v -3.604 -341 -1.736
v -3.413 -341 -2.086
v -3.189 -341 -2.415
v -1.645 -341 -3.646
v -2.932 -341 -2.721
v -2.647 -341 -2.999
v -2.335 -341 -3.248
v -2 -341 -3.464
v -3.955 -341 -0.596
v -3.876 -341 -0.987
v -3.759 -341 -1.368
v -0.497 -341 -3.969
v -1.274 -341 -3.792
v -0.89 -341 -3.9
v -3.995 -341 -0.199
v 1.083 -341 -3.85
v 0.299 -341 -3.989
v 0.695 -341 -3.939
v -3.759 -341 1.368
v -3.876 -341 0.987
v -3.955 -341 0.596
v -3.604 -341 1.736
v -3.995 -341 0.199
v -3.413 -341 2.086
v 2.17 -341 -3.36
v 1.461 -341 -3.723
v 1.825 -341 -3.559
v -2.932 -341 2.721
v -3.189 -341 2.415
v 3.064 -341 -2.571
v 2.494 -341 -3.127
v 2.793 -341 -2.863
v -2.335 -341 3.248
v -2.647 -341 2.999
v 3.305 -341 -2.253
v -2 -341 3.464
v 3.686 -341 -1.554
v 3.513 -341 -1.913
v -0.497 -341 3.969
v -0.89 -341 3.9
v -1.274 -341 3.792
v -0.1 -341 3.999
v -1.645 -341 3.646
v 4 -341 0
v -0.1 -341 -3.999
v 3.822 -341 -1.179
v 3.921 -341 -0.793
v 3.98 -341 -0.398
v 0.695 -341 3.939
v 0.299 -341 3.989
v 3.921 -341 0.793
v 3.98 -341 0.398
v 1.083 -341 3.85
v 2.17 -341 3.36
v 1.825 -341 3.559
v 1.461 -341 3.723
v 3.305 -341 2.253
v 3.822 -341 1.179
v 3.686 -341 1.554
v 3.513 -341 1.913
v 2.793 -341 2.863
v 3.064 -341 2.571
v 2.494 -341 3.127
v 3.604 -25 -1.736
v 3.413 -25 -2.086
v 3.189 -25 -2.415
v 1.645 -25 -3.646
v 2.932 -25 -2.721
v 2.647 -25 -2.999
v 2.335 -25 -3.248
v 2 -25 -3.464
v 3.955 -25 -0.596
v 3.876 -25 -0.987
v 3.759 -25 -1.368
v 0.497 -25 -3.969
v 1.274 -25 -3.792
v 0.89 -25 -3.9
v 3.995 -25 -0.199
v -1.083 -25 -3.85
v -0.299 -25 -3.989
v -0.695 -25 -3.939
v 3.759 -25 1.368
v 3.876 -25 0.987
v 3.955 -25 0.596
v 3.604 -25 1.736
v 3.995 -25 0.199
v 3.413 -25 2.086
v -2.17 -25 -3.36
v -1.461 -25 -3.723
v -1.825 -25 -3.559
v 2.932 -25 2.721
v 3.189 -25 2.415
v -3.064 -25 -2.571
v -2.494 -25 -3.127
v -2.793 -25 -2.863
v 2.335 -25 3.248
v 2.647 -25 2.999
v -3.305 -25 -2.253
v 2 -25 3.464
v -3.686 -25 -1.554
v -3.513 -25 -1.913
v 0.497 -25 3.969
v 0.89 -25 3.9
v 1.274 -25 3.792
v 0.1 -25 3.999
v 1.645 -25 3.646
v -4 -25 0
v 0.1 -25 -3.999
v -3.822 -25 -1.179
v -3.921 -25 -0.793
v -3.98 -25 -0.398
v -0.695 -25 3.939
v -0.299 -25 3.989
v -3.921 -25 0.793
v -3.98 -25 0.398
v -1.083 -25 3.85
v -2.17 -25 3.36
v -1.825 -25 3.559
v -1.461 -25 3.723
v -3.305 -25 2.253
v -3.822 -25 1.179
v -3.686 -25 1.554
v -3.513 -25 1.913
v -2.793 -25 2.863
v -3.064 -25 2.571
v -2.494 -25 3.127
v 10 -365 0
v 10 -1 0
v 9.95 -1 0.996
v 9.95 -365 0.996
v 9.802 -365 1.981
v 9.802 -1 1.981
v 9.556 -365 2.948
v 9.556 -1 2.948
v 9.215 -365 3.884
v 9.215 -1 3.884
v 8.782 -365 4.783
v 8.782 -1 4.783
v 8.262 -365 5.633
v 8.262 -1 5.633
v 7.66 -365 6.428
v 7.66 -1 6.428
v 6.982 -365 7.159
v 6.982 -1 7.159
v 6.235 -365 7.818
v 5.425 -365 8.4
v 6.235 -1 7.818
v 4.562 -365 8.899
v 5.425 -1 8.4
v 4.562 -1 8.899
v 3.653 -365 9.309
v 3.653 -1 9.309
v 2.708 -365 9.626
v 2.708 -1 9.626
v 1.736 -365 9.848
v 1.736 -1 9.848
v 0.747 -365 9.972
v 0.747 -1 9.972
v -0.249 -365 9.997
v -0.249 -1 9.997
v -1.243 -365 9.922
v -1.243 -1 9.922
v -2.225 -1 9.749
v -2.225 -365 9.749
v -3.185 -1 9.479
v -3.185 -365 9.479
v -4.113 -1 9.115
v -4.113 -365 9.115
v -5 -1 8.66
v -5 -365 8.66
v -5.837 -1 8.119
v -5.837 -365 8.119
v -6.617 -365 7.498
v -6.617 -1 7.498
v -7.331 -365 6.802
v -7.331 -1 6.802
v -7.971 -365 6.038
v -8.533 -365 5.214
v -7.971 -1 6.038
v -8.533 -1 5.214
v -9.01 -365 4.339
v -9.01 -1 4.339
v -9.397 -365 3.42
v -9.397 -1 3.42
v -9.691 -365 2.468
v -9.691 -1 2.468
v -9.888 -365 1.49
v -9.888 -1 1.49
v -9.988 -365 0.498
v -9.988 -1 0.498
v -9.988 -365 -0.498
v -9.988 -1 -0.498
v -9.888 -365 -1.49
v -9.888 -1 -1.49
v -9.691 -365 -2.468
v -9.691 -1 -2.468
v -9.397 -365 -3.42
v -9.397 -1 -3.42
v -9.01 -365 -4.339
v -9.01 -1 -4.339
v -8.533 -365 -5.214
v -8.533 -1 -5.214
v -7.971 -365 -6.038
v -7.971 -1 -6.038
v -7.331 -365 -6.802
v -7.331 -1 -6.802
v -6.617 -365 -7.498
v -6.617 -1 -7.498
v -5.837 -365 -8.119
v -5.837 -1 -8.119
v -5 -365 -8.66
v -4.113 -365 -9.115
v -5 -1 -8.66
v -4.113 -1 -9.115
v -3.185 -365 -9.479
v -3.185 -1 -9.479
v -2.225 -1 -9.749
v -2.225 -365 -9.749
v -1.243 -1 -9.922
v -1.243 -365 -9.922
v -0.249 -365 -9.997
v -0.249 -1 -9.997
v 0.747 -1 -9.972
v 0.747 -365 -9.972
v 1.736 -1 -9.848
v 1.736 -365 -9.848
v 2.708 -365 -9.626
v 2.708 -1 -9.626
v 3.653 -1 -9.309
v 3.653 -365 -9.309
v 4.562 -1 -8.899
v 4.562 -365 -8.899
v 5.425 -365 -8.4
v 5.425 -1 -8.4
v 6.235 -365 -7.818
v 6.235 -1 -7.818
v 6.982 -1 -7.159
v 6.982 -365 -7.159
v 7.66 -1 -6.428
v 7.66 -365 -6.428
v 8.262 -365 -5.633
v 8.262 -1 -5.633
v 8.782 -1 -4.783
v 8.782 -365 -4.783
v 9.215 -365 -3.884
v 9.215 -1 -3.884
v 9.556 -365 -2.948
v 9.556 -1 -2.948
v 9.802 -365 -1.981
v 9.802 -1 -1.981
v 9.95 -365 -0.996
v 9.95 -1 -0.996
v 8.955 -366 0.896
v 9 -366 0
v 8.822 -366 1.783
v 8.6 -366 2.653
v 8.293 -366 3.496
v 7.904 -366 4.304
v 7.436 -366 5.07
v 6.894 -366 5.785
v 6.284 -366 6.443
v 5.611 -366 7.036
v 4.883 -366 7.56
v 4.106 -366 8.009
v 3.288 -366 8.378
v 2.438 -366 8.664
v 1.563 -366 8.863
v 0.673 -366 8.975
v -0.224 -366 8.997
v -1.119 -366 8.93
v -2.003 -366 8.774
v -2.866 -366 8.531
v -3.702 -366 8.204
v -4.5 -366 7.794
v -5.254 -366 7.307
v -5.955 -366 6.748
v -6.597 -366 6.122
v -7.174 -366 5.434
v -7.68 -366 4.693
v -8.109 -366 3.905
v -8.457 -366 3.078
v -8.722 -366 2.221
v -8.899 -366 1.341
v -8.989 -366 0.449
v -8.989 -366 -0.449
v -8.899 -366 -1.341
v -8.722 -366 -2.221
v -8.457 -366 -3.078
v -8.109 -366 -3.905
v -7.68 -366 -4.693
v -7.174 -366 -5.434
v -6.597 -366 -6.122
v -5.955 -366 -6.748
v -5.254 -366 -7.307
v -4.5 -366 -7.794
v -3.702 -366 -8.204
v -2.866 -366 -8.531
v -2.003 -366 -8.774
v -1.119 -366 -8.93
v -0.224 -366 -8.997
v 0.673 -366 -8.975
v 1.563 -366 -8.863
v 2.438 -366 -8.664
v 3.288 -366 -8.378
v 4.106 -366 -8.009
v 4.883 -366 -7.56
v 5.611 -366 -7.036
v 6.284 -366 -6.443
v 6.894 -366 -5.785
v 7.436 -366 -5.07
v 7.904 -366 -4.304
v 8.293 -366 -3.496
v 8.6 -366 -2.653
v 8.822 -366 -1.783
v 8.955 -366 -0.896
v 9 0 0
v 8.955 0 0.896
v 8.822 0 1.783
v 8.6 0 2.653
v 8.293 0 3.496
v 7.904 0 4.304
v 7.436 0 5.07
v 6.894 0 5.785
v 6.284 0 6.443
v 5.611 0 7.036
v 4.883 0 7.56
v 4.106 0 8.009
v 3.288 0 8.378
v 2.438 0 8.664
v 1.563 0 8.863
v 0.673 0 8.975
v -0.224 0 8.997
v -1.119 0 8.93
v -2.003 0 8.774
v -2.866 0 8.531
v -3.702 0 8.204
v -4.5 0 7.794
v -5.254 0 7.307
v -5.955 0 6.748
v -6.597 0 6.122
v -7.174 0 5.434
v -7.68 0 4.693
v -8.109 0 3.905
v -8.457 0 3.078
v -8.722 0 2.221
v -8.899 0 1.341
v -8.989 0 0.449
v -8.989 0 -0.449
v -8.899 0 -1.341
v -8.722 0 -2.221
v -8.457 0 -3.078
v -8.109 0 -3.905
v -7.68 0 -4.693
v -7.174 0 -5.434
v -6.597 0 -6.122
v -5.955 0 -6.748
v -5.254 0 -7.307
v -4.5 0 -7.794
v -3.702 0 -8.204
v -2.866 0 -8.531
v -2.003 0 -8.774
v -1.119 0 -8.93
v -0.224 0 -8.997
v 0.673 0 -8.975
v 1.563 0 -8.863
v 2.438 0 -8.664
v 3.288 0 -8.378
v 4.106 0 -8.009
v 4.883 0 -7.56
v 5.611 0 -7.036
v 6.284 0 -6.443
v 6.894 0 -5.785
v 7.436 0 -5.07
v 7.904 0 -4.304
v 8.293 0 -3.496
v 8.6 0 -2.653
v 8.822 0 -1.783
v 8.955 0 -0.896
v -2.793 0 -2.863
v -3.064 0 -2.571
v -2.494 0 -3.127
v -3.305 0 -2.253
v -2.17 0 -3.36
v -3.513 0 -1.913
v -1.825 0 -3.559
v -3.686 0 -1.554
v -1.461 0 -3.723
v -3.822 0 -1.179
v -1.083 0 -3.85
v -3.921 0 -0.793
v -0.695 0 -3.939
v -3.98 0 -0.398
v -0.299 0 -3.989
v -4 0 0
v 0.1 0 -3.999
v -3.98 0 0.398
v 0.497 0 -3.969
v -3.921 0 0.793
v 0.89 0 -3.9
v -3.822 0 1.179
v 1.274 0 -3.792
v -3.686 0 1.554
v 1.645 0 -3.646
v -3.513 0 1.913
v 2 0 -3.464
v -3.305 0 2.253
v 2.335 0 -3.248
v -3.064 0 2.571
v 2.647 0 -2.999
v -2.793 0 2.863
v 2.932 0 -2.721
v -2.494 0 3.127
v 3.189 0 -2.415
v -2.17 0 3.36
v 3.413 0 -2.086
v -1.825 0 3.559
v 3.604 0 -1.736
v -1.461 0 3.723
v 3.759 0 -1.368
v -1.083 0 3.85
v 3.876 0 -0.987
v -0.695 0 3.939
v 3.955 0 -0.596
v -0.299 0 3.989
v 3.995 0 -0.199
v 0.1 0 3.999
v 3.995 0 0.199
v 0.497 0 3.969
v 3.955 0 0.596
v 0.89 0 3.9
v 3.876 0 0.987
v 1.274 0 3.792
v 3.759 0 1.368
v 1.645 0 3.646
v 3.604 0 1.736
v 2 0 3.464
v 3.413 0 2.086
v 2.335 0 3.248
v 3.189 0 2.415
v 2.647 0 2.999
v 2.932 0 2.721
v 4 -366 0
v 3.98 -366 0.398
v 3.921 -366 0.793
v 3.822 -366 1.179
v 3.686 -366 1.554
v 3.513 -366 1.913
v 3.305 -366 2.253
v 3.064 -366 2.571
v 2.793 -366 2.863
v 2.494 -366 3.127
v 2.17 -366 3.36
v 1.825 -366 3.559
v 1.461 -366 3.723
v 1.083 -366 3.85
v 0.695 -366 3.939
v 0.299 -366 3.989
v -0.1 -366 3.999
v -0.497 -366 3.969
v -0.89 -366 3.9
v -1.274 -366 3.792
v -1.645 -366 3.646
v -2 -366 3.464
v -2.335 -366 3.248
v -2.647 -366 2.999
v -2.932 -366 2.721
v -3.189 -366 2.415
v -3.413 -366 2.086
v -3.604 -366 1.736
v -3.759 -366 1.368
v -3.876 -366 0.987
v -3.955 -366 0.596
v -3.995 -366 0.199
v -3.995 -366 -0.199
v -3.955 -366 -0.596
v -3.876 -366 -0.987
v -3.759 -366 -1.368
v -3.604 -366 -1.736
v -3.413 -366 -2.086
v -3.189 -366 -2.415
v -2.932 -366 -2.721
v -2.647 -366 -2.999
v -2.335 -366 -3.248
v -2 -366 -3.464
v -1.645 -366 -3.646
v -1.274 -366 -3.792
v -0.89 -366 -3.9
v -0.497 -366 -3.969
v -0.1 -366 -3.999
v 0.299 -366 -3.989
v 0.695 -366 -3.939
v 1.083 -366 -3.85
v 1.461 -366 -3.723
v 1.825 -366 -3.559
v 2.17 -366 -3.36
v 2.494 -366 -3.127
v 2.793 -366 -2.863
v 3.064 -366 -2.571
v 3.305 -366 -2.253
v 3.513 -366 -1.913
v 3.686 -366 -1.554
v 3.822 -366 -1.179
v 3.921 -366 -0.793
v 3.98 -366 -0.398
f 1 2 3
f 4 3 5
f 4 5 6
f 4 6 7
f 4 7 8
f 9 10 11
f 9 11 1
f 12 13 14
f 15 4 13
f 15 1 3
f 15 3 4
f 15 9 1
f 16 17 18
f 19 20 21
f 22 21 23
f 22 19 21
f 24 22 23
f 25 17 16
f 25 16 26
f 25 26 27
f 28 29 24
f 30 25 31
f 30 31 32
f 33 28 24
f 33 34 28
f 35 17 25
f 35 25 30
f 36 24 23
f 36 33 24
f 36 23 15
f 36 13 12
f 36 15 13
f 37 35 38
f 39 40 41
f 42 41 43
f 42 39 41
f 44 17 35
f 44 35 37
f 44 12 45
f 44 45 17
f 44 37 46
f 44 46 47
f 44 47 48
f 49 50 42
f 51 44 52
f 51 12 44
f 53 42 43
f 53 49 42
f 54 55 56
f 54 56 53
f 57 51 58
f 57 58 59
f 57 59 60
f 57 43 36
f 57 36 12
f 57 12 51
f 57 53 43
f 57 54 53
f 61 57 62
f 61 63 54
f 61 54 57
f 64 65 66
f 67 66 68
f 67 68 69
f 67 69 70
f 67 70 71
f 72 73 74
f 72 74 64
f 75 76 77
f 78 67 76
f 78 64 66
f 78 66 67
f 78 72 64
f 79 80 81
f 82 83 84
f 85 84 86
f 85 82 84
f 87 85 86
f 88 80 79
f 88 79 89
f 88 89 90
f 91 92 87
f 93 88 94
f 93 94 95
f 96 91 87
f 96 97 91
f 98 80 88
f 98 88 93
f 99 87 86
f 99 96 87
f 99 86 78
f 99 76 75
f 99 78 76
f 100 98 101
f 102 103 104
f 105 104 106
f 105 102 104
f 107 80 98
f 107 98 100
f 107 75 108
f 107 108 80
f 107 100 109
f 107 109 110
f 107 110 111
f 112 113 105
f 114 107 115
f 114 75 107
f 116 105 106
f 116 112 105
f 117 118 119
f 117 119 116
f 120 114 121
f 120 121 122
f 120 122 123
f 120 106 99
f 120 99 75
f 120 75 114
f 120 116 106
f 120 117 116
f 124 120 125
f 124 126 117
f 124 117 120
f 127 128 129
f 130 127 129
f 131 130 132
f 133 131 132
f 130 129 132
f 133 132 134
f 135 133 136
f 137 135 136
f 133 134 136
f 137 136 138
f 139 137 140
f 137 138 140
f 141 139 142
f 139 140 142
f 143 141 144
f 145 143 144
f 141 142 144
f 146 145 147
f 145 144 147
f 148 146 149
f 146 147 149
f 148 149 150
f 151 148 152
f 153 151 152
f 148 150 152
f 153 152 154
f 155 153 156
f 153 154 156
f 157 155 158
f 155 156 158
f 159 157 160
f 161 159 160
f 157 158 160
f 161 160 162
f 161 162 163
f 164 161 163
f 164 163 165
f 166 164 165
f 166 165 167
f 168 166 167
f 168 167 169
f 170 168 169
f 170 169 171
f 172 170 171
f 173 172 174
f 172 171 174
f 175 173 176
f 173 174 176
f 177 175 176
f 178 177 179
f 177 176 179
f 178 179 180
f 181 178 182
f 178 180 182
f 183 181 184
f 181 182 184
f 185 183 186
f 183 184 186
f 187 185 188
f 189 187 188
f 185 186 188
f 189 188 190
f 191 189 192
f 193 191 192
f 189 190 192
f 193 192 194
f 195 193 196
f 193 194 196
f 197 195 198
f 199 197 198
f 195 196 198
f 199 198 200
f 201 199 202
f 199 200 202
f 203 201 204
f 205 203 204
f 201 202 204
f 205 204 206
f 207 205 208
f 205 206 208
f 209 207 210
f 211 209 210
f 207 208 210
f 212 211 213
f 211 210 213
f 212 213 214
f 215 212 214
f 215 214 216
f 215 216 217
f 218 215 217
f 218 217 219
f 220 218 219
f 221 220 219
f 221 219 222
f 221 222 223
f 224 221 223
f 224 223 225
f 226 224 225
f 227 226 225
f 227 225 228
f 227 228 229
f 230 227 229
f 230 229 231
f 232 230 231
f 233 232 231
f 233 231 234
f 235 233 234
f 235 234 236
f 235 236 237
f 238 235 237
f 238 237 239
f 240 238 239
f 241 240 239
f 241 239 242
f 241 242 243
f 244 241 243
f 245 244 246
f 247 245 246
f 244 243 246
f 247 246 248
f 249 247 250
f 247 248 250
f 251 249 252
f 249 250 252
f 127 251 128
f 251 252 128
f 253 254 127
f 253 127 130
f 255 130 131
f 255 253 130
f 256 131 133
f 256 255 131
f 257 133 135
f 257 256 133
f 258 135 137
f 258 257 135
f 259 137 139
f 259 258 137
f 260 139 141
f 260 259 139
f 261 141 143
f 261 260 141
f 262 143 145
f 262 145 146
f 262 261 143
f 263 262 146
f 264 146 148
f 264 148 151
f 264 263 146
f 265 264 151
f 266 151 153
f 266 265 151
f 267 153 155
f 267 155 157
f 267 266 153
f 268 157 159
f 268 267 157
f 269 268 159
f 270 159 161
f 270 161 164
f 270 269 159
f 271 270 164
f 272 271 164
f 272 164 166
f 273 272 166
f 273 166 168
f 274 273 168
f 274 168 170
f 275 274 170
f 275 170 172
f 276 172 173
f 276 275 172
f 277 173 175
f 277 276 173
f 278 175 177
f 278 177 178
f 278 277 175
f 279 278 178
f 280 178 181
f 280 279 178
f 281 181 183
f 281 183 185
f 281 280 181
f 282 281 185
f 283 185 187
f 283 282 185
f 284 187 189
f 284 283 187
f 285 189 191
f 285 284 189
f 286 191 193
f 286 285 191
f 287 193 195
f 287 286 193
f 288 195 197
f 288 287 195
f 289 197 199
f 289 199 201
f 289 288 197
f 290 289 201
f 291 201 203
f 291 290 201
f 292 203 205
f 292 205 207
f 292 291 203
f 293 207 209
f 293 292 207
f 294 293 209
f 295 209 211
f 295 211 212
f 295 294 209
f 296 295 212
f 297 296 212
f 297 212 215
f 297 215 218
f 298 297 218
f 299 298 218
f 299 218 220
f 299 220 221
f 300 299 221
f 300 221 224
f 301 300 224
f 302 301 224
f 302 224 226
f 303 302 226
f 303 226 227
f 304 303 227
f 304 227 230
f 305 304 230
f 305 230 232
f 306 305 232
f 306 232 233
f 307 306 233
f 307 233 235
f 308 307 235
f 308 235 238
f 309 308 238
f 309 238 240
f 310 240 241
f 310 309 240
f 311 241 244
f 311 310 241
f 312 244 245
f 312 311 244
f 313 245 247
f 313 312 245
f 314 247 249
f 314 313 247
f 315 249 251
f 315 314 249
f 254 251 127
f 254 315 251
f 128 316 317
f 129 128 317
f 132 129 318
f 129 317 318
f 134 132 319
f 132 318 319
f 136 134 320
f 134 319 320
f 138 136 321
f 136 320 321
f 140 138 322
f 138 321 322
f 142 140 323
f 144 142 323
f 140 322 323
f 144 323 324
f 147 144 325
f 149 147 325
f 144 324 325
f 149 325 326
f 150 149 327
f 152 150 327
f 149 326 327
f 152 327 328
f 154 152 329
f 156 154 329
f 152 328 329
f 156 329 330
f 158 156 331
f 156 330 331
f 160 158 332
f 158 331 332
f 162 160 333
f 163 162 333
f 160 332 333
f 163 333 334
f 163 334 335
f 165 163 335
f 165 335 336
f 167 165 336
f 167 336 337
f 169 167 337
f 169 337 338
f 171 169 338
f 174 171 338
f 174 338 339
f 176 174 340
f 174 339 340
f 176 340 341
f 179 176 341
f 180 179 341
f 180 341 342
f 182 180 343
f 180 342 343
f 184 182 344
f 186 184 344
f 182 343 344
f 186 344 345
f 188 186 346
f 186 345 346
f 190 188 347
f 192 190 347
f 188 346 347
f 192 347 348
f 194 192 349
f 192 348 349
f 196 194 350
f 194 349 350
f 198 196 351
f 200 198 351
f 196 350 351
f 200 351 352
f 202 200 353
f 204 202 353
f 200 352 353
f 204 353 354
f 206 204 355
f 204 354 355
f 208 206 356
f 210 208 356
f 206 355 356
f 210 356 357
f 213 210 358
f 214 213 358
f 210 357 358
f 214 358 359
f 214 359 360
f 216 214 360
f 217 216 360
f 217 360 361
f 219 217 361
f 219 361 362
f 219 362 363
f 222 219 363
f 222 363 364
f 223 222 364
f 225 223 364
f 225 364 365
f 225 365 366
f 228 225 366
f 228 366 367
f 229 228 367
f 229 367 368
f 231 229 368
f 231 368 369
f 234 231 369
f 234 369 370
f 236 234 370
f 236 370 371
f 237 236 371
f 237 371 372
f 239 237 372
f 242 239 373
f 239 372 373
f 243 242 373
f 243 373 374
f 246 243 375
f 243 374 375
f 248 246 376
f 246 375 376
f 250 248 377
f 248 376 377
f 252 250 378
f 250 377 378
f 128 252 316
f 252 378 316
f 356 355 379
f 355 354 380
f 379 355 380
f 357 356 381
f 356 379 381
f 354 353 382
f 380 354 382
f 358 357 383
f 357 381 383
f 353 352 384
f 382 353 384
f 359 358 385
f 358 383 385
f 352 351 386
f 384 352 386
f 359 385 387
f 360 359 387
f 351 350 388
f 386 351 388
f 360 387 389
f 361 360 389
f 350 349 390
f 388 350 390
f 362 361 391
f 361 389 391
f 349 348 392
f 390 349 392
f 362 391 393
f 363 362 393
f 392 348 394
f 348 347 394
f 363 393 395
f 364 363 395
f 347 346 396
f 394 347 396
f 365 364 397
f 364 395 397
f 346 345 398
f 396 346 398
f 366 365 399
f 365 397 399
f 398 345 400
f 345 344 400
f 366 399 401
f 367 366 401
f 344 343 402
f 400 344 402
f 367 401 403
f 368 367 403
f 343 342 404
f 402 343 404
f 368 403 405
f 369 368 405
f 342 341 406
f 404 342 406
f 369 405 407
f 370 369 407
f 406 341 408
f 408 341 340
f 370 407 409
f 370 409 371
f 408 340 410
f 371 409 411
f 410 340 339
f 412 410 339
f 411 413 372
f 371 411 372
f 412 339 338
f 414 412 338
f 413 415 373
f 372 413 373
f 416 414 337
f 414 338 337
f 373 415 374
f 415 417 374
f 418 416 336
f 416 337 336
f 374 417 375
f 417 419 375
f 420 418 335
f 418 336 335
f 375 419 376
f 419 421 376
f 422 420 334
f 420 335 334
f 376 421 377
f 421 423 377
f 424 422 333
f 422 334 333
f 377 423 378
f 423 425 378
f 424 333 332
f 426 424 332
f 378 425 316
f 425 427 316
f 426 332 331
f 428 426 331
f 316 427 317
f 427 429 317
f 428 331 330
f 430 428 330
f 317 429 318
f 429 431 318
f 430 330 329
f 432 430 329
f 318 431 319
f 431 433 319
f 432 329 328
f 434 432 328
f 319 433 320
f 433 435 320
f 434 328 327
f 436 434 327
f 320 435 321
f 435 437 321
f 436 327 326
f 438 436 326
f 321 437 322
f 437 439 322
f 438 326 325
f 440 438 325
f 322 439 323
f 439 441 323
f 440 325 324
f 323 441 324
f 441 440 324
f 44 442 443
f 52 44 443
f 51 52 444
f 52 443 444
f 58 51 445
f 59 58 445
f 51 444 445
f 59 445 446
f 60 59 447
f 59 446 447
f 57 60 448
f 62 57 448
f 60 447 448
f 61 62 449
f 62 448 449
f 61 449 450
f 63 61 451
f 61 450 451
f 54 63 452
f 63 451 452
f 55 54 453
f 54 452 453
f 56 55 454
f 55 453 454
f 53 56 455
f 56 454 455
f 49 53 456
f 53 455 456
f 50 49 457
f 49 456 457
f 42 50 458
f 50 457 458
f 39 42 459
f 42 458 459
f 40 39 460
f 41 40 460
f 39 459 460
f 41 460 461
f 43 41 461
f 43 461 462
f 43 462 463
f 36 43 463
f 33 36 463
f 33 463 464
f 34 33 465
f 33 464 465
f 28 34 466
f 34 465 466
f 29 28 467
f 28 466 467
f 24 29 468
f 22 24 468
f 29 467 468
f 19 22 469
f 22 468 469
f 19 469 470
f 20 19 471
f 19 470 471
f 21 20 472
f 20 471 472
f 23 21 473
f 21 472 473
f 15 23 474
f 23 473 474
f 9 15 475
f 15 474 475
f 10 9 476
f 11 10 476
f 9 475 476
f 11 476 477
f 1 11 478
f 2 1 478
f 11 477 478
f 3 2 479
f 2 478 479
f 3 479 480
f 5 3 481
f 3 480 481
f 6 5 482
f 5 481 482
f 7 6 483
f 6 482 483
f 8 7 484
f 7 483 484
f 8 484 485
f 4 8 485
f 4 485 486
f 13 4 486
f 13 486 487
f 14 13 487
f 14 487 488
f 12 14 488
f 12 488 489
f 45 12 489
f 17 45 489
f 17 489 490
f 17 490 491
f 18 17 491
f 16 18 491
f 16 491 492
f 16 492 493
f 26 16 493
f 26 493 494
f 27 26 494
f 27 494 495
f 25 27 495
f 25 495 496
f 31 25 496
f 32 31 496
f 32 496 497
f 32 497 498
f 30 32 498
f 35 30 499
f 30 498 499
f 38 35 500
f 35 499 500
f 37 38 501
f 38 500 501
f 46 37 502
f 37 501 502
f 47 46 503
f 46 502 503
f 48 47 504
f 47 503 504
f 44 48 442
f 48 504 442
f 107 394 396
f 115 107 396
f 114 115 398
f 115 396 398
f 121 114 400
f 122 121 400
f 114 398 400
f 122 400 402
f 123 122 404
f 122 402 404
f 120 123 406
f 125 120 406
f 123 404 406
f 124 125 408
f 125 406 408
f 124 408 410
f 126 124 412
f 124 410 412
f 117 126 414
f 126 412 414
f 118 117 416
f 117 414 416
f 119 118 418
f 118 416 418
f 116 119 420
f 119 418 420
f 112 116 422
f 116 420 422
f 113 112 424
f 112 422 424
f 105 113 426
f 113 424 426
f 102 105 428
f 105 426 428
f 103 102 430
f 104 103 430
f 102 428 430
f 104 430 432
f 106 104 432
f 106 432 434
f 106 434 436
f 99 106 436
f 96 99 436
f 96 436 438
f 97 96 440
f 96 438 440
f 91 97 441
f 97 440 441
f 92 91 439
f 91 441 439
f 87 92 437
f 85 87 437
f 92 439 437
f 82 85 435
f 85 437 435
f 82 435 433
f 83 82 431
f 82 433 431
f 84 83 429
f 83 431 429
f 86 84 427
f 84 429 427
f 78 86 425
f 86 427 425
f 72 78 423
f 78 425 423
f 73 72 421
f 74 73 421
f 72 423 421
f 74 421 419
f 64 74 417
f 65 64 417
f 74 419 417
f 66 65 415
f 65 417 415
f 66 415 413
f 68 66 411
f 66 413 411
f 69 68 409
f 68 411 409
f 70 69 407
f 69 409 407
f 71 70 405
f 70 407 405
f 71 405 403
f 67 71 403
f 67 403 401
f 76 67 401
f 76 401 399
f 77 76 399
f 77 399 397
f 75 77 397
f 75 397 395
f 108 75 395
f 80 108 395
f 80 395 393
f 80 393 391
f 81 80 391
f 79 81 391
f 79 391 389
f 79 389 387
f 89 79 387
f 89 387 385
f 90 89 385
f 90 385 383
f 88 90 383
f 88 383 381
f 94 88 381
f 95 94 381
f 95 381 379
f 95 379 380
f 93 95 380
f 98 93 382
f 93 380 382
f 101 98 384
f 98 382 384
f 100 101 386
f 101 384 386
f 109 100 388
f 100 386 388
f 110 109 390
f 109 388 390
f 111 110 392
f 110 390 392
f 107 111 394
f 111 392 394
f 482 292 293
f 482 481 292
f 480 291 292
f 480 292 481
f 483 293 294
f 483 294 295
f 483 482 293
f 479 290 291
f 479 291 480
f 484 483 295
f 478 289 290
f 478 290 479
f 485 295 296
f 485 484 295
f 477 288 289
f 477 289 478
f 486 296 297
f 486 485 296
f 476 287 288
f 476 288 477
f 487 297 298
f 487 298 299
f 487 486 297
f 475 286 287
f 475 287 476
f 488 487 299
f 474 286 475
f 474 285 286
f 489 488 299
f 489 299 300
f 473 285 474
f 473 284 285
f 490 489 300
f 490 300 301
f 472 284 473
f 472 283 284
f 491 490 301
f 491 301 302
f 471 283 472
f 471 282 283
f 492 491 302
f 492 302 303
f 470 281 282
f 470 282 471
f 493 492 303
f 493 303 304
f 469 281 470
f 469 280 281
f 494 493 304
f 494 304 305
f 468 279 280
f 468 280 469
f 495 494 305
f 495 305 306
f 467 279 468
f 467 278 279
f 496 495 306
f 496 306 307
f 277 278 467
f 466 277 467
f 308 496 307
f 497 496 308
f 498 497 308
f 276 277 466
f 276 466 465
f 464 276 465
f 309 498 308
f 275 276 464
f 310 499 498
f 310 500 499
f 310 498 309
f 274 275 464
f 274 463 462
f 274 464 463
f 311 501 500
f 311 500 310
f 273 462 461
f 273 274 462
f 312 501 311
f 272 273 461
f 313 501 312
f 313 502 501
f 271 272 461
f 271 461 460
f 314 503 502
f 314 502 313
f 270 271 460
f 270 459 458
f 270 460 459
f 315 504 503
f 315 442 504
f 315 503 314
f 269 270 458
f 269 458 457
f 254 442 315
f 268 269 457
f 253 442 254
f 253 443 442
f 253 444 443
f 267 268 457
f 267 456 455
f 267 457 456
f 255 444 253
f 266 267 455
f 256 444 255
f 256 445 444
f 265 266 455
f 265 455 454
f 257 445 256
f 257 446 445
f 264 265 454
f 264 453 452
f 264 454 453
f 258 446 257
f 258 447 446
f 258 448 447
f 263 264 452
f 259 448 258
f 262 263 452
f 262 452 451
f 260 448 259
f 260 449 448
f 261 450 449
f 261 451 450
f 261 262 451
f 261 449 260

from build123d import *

# Parameters (mm, degrees)
F0_R     = 10
F1_DEPTH = 366
F2_SIZE  = 1
F3_R     = 4
F4_DEPTH = 25
F5_R     = 4
F6_DEPTH = 25


with BuildPart() as f1:
    # F0 (on Front) → F1 (new body)
    with BuildSketch(Plane.XZ):
        Circle(F0_R)
    extrude(amount=F1_DEPTH)

    # F2
    f2_edges = [f1.edges().sort_by_distance(p)[0] for p in [
        (-10, -366, 0),
        (-10, 0, 0),
    ]]
    chamfer(f2_edges, length=F2_SIZE)

    # F3 (on face) → F4 (cut)
    with BuildSketch(Plane.XZ.offset(366)):
        Circle(F3_R)
    extrude(amount=-F4_DEPTH, mode=Mode.SUBTRACT)

    # F5 (on face) → F6 (cut)
    with BuildSketch(Plane(origin=(0, 0, 0), x_dir=(-1, 0, 0), z_dir=(0, 1, 0))):
        Circle(F5_R)
    extrude(amount=-F6_DEPTH, mode=Mode.SUBTRACT)


solid = f1.part
